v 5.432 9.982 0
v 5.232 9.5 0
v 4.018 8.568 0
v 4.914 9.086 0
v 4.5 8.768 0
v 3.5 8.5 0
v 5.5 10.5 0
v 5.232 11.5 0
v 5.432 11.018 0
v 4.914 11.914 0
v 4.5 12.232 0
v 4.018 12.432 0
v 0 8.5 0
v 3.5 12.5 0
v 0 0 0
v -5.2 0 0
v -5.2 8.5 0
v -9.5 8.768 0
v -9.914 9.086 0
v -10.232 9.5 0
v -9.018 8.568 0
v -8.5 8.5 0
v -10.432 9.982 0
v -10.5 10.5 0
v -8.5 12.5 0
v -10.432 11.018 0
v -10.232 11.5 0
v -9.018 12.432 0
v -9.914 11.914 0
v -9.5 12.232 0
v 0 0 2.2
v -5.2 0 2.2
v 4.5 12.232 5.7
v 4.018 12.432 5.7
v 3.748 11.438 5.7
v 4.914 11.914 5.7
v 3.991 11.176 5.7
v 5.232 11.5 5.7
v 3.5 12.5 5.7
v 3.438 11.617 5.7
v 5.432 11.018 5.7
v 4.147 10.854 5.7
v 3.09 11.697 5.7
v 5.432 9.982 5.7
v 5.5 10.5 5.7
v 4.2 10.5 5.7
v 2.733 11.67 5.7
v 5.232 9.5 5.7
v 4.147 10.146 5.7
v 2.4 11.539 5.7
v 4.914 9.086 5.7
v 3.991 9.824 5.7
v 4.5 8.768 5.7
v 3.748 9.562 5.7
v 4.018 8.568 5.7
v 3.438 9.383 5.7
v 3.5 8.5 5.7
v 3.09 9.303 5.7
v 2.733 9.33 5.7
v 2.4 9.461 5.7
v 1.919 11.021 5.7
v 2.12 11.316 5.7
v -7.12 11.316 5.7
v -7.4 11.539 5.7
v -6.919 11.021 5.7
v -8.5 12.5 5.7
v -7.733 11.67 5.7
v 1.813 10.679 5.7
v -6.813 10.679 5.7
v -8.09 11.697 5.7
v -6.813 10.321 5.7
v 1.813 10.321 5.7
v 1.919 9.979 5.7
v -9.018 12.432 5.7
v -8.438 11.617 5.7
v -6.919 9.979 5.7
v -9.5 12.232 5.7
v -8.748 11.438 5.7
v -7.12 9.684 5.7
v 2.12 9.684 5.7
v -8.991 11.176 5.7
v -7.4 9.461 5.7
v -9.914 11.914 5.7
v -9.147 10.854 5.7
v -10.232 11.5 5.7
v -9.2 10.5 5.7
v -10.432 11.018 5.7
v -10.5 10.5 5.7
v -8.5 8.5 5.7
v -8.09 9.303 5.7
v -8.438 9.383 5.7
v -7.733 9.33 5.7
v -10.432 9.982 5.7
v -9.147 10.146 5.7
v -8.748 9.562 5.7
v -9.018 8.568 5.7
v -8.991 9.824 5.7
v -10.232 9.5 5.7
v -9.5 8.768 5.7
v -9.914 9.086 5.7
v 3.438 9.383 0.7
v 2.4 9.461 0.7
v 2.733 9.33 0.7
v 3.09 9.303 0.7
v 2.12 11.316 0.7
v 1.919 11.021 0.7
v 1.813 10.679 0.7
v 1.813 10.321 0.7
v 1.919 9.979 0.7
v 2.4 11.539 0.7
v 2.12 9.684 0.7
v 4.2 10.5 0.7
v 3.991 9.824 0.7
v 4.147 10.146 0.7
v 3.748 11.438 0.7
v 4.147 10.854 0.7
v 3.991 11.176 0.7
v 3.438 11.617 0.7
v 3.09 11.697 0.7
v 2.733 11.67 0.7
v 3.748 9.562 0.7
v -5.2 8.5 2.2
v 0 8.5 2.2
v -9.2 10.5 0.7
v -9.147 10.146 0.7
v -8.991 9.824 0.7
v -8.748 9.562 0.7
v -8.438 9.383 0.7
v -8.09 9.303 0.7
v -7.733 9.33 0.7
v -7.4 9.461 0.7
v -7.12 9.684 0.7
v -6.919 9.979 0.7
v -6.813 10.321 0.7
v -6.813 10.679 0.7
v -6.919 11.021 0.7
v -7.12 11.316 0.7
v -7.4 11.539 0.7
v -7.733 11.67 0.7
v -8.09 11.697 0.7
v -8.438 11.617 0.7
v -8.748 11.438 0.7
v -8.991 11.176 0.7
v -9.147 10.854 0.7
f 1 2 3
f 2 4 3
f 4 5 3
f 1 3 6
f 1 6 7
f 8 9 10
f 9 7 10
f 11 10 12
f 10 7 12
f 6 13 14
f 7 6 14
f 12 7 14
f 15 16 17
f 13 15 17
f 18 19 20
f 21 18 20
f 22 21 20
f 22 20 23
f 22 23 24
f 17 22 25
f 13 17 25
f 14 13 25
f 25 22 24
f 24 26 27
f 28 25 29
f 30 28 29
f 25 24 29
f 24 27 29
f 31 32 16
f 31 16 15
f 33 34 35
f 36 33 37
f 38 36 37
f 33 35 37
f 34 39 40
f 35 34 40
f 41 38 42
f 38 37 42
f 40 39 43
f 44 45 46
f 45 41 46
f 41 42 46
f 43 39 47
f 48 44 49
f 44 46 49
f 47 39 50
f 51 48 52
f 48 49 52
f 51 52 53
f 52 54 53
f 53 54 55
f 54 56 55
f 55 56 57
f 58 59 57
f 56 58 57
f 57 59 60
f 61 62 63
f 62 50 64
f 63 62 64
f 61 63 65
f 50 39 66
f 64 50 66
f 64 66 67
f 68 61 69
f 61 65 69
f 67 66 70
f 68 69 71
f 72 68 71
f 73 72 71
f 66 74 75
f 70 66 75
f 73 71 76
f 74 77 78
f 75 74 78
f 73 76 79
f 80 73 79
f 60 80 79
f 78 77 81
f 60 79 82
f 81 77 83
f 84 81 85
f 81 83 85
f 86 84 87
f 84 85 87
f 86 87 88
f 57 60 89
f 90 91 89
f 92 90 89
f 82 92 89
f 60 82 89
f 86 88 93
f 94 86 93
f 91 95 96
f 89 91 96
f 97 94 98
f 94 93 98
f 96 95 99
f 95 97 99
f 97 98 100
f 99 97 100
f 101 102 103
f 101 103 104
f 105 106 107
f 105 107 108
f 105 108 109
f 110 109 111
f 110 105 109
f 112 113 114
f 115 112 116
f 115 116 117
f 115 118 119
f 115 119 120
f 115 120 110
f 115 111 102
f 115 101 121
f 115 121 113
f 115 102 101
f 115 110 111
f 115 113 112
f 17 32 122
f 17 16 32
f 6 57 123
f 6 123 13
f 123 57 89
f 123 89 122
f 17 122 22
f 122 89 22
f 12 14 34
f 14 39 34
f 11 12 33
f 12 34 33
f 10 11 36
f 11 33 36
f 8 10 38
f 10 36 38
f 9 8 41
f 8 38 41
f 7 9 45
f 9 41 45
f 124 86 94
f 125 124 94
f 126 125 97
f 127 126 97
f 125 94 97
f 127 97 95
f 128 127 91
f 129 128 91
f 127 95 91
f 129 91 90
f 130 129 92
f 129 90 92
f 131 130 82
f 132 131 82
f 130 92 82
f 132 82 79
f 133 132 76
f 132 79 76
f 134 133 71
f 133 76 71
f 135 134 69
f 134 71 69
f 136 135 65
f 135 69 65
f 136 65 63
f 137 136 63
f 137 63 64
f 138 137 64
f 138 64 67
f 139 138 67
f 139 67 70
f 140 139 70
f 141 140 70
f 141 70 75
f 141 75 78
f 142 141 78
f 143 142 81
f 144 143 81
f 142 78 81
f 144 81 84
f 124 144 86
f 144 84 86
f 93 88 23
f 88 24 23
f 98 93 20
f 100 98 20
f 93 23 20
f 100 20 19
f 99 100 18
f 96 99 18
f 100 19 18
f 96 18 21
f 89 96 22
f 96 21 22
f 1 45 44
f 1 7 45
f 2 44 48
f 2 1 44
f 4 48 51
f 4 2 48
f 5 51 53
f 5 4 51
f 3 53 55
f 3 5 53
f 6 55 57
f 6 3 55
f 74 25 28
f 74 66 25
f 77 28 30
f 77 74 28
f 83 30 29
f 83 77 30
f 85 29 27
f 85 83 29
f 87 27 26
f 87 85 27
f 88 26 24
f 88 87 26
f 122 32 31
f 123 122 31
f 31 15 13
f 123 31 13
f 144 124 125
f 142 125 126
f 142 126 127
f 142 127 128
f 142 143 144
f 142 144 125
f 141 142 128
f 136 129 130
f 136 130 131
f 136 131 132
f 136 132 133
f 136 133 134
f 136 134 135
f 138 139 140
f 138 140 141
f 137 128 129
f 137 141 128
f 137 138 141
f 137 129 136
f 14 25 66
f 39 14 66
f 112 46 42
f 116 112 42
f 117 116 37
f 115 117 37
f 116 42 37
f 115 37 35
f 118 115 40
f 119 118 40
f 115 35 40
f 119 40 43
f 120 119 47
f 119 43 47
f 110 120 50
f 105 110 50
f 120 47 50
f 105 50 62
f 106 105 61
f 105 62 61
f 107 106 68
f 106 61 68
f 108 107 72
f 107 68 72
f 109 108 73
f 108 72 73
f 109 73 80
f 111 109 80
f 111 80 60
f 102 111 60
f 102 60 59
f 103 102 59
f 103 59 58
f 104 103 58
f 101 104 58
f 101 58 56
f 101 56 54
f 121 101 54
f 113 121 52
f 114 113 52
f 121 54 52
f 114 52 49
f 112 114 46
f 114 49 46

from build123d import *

# Parameters (mm, degrees)
F0_W          = 5.2
F0_H          = 2.2
F1_DEPTH      = 12.5
F2_W          = 5.2
F2_H          = 4
F3_DEPTH      = 3.5
F5_DEPTH      = 10.5
F5_DEPTH_BACK = 5.5
F7_DEPTH      = 5
F8_R          = 1.99999


# Not quite as in the source:
# - a fillet or chamfer is up to 0.001 mm smaller than in the source, because OpenCascade refuses the exact size


with BuildPart() as f1:
    # F0 (on Front) → F1 (new body)
    with BuildSketch(Plane.XZ):
        with Locations((-2.6, 1.1)):
            Rectangle(F0_W, F0_H)
    extrude(amount=-F1_DEPTH)

    # F2 (on face) → F3 (join)
    with BuildSketch(Plane.XY.offset(2.2)):
        with Locations((-2.6, 10.5)):
            Rectangle(F2_W, F2_H)
    extrude(amount=F3_DEPTH)

    # F4 (on face) → F5 (join, two sides)
    with BuildSketch(Plane.YZ) as f5_sk:
        Polygon((12.5, 0), (12.5, 5.7), (8.5, 5.7), (8.5, 2.2), (8.5, 0), align=None)
    extrude(amount=-F5_DEPTH)
    extrude(f5_sk.sketch, amount=F5_DEPTH_BACK)

    # F6 (on face) → F7 (cut)
    with BuildSketch(Plane.XY.offset(5.7)):
        with BuildLine():
            Line((-9.2, 10.5), (-8, 10.5))
            Line((-8, 10.5), (-6.8, 10.5))
            ThreePointArc((-6.8, 10.5), (-8, 11.7), (-9.2, 10.5))
        make_face()
        with BuildLine():
            Line((-6.8, 10.5), (-8, 10.5))
            Line((-8, 10.5), (-9.2, 10.5))
            ThreePointArc((-9.2, 10.5), (-8, 9.3), (-6.8, 10.5))
        make_face()
        with BuildLine():
            Line((3, 10.5), (1.8, 10.5))
            ThreePointArc((1.8, 10.5), (3, 9.3), (4.2, 10.5))
            Line((4.2, 10.5), (3, 10.5))
        make_face()
        with BuildLine():
            ThreePointArc((4.2, 10.5), (3, 11.7), (1.8, 10.5))
            Line((1.8, 10.5), (3, 10.5))
            Line((3, 10.5), (4.2, 10.5))
        make_face()
    extrude(amount=-F7_DEPTH, mode=Mode.SUBTRACT)

    # F8 (radius 2 in the source; OpenCascade refuses exactly that, so slightly less here)
    f8_edges = [f1.edges().sort_by_distance(p)[0] for p in [
        (5.5, 8.5, 2.85),
        (5.5, 12.5, 2.85),
        (-10.5, 12.5, 2.85),
        (-10.5, 8.5, 2.85),
    ]]
    fillet(f8_edges, radius=F8_R)


solid = f1.part
